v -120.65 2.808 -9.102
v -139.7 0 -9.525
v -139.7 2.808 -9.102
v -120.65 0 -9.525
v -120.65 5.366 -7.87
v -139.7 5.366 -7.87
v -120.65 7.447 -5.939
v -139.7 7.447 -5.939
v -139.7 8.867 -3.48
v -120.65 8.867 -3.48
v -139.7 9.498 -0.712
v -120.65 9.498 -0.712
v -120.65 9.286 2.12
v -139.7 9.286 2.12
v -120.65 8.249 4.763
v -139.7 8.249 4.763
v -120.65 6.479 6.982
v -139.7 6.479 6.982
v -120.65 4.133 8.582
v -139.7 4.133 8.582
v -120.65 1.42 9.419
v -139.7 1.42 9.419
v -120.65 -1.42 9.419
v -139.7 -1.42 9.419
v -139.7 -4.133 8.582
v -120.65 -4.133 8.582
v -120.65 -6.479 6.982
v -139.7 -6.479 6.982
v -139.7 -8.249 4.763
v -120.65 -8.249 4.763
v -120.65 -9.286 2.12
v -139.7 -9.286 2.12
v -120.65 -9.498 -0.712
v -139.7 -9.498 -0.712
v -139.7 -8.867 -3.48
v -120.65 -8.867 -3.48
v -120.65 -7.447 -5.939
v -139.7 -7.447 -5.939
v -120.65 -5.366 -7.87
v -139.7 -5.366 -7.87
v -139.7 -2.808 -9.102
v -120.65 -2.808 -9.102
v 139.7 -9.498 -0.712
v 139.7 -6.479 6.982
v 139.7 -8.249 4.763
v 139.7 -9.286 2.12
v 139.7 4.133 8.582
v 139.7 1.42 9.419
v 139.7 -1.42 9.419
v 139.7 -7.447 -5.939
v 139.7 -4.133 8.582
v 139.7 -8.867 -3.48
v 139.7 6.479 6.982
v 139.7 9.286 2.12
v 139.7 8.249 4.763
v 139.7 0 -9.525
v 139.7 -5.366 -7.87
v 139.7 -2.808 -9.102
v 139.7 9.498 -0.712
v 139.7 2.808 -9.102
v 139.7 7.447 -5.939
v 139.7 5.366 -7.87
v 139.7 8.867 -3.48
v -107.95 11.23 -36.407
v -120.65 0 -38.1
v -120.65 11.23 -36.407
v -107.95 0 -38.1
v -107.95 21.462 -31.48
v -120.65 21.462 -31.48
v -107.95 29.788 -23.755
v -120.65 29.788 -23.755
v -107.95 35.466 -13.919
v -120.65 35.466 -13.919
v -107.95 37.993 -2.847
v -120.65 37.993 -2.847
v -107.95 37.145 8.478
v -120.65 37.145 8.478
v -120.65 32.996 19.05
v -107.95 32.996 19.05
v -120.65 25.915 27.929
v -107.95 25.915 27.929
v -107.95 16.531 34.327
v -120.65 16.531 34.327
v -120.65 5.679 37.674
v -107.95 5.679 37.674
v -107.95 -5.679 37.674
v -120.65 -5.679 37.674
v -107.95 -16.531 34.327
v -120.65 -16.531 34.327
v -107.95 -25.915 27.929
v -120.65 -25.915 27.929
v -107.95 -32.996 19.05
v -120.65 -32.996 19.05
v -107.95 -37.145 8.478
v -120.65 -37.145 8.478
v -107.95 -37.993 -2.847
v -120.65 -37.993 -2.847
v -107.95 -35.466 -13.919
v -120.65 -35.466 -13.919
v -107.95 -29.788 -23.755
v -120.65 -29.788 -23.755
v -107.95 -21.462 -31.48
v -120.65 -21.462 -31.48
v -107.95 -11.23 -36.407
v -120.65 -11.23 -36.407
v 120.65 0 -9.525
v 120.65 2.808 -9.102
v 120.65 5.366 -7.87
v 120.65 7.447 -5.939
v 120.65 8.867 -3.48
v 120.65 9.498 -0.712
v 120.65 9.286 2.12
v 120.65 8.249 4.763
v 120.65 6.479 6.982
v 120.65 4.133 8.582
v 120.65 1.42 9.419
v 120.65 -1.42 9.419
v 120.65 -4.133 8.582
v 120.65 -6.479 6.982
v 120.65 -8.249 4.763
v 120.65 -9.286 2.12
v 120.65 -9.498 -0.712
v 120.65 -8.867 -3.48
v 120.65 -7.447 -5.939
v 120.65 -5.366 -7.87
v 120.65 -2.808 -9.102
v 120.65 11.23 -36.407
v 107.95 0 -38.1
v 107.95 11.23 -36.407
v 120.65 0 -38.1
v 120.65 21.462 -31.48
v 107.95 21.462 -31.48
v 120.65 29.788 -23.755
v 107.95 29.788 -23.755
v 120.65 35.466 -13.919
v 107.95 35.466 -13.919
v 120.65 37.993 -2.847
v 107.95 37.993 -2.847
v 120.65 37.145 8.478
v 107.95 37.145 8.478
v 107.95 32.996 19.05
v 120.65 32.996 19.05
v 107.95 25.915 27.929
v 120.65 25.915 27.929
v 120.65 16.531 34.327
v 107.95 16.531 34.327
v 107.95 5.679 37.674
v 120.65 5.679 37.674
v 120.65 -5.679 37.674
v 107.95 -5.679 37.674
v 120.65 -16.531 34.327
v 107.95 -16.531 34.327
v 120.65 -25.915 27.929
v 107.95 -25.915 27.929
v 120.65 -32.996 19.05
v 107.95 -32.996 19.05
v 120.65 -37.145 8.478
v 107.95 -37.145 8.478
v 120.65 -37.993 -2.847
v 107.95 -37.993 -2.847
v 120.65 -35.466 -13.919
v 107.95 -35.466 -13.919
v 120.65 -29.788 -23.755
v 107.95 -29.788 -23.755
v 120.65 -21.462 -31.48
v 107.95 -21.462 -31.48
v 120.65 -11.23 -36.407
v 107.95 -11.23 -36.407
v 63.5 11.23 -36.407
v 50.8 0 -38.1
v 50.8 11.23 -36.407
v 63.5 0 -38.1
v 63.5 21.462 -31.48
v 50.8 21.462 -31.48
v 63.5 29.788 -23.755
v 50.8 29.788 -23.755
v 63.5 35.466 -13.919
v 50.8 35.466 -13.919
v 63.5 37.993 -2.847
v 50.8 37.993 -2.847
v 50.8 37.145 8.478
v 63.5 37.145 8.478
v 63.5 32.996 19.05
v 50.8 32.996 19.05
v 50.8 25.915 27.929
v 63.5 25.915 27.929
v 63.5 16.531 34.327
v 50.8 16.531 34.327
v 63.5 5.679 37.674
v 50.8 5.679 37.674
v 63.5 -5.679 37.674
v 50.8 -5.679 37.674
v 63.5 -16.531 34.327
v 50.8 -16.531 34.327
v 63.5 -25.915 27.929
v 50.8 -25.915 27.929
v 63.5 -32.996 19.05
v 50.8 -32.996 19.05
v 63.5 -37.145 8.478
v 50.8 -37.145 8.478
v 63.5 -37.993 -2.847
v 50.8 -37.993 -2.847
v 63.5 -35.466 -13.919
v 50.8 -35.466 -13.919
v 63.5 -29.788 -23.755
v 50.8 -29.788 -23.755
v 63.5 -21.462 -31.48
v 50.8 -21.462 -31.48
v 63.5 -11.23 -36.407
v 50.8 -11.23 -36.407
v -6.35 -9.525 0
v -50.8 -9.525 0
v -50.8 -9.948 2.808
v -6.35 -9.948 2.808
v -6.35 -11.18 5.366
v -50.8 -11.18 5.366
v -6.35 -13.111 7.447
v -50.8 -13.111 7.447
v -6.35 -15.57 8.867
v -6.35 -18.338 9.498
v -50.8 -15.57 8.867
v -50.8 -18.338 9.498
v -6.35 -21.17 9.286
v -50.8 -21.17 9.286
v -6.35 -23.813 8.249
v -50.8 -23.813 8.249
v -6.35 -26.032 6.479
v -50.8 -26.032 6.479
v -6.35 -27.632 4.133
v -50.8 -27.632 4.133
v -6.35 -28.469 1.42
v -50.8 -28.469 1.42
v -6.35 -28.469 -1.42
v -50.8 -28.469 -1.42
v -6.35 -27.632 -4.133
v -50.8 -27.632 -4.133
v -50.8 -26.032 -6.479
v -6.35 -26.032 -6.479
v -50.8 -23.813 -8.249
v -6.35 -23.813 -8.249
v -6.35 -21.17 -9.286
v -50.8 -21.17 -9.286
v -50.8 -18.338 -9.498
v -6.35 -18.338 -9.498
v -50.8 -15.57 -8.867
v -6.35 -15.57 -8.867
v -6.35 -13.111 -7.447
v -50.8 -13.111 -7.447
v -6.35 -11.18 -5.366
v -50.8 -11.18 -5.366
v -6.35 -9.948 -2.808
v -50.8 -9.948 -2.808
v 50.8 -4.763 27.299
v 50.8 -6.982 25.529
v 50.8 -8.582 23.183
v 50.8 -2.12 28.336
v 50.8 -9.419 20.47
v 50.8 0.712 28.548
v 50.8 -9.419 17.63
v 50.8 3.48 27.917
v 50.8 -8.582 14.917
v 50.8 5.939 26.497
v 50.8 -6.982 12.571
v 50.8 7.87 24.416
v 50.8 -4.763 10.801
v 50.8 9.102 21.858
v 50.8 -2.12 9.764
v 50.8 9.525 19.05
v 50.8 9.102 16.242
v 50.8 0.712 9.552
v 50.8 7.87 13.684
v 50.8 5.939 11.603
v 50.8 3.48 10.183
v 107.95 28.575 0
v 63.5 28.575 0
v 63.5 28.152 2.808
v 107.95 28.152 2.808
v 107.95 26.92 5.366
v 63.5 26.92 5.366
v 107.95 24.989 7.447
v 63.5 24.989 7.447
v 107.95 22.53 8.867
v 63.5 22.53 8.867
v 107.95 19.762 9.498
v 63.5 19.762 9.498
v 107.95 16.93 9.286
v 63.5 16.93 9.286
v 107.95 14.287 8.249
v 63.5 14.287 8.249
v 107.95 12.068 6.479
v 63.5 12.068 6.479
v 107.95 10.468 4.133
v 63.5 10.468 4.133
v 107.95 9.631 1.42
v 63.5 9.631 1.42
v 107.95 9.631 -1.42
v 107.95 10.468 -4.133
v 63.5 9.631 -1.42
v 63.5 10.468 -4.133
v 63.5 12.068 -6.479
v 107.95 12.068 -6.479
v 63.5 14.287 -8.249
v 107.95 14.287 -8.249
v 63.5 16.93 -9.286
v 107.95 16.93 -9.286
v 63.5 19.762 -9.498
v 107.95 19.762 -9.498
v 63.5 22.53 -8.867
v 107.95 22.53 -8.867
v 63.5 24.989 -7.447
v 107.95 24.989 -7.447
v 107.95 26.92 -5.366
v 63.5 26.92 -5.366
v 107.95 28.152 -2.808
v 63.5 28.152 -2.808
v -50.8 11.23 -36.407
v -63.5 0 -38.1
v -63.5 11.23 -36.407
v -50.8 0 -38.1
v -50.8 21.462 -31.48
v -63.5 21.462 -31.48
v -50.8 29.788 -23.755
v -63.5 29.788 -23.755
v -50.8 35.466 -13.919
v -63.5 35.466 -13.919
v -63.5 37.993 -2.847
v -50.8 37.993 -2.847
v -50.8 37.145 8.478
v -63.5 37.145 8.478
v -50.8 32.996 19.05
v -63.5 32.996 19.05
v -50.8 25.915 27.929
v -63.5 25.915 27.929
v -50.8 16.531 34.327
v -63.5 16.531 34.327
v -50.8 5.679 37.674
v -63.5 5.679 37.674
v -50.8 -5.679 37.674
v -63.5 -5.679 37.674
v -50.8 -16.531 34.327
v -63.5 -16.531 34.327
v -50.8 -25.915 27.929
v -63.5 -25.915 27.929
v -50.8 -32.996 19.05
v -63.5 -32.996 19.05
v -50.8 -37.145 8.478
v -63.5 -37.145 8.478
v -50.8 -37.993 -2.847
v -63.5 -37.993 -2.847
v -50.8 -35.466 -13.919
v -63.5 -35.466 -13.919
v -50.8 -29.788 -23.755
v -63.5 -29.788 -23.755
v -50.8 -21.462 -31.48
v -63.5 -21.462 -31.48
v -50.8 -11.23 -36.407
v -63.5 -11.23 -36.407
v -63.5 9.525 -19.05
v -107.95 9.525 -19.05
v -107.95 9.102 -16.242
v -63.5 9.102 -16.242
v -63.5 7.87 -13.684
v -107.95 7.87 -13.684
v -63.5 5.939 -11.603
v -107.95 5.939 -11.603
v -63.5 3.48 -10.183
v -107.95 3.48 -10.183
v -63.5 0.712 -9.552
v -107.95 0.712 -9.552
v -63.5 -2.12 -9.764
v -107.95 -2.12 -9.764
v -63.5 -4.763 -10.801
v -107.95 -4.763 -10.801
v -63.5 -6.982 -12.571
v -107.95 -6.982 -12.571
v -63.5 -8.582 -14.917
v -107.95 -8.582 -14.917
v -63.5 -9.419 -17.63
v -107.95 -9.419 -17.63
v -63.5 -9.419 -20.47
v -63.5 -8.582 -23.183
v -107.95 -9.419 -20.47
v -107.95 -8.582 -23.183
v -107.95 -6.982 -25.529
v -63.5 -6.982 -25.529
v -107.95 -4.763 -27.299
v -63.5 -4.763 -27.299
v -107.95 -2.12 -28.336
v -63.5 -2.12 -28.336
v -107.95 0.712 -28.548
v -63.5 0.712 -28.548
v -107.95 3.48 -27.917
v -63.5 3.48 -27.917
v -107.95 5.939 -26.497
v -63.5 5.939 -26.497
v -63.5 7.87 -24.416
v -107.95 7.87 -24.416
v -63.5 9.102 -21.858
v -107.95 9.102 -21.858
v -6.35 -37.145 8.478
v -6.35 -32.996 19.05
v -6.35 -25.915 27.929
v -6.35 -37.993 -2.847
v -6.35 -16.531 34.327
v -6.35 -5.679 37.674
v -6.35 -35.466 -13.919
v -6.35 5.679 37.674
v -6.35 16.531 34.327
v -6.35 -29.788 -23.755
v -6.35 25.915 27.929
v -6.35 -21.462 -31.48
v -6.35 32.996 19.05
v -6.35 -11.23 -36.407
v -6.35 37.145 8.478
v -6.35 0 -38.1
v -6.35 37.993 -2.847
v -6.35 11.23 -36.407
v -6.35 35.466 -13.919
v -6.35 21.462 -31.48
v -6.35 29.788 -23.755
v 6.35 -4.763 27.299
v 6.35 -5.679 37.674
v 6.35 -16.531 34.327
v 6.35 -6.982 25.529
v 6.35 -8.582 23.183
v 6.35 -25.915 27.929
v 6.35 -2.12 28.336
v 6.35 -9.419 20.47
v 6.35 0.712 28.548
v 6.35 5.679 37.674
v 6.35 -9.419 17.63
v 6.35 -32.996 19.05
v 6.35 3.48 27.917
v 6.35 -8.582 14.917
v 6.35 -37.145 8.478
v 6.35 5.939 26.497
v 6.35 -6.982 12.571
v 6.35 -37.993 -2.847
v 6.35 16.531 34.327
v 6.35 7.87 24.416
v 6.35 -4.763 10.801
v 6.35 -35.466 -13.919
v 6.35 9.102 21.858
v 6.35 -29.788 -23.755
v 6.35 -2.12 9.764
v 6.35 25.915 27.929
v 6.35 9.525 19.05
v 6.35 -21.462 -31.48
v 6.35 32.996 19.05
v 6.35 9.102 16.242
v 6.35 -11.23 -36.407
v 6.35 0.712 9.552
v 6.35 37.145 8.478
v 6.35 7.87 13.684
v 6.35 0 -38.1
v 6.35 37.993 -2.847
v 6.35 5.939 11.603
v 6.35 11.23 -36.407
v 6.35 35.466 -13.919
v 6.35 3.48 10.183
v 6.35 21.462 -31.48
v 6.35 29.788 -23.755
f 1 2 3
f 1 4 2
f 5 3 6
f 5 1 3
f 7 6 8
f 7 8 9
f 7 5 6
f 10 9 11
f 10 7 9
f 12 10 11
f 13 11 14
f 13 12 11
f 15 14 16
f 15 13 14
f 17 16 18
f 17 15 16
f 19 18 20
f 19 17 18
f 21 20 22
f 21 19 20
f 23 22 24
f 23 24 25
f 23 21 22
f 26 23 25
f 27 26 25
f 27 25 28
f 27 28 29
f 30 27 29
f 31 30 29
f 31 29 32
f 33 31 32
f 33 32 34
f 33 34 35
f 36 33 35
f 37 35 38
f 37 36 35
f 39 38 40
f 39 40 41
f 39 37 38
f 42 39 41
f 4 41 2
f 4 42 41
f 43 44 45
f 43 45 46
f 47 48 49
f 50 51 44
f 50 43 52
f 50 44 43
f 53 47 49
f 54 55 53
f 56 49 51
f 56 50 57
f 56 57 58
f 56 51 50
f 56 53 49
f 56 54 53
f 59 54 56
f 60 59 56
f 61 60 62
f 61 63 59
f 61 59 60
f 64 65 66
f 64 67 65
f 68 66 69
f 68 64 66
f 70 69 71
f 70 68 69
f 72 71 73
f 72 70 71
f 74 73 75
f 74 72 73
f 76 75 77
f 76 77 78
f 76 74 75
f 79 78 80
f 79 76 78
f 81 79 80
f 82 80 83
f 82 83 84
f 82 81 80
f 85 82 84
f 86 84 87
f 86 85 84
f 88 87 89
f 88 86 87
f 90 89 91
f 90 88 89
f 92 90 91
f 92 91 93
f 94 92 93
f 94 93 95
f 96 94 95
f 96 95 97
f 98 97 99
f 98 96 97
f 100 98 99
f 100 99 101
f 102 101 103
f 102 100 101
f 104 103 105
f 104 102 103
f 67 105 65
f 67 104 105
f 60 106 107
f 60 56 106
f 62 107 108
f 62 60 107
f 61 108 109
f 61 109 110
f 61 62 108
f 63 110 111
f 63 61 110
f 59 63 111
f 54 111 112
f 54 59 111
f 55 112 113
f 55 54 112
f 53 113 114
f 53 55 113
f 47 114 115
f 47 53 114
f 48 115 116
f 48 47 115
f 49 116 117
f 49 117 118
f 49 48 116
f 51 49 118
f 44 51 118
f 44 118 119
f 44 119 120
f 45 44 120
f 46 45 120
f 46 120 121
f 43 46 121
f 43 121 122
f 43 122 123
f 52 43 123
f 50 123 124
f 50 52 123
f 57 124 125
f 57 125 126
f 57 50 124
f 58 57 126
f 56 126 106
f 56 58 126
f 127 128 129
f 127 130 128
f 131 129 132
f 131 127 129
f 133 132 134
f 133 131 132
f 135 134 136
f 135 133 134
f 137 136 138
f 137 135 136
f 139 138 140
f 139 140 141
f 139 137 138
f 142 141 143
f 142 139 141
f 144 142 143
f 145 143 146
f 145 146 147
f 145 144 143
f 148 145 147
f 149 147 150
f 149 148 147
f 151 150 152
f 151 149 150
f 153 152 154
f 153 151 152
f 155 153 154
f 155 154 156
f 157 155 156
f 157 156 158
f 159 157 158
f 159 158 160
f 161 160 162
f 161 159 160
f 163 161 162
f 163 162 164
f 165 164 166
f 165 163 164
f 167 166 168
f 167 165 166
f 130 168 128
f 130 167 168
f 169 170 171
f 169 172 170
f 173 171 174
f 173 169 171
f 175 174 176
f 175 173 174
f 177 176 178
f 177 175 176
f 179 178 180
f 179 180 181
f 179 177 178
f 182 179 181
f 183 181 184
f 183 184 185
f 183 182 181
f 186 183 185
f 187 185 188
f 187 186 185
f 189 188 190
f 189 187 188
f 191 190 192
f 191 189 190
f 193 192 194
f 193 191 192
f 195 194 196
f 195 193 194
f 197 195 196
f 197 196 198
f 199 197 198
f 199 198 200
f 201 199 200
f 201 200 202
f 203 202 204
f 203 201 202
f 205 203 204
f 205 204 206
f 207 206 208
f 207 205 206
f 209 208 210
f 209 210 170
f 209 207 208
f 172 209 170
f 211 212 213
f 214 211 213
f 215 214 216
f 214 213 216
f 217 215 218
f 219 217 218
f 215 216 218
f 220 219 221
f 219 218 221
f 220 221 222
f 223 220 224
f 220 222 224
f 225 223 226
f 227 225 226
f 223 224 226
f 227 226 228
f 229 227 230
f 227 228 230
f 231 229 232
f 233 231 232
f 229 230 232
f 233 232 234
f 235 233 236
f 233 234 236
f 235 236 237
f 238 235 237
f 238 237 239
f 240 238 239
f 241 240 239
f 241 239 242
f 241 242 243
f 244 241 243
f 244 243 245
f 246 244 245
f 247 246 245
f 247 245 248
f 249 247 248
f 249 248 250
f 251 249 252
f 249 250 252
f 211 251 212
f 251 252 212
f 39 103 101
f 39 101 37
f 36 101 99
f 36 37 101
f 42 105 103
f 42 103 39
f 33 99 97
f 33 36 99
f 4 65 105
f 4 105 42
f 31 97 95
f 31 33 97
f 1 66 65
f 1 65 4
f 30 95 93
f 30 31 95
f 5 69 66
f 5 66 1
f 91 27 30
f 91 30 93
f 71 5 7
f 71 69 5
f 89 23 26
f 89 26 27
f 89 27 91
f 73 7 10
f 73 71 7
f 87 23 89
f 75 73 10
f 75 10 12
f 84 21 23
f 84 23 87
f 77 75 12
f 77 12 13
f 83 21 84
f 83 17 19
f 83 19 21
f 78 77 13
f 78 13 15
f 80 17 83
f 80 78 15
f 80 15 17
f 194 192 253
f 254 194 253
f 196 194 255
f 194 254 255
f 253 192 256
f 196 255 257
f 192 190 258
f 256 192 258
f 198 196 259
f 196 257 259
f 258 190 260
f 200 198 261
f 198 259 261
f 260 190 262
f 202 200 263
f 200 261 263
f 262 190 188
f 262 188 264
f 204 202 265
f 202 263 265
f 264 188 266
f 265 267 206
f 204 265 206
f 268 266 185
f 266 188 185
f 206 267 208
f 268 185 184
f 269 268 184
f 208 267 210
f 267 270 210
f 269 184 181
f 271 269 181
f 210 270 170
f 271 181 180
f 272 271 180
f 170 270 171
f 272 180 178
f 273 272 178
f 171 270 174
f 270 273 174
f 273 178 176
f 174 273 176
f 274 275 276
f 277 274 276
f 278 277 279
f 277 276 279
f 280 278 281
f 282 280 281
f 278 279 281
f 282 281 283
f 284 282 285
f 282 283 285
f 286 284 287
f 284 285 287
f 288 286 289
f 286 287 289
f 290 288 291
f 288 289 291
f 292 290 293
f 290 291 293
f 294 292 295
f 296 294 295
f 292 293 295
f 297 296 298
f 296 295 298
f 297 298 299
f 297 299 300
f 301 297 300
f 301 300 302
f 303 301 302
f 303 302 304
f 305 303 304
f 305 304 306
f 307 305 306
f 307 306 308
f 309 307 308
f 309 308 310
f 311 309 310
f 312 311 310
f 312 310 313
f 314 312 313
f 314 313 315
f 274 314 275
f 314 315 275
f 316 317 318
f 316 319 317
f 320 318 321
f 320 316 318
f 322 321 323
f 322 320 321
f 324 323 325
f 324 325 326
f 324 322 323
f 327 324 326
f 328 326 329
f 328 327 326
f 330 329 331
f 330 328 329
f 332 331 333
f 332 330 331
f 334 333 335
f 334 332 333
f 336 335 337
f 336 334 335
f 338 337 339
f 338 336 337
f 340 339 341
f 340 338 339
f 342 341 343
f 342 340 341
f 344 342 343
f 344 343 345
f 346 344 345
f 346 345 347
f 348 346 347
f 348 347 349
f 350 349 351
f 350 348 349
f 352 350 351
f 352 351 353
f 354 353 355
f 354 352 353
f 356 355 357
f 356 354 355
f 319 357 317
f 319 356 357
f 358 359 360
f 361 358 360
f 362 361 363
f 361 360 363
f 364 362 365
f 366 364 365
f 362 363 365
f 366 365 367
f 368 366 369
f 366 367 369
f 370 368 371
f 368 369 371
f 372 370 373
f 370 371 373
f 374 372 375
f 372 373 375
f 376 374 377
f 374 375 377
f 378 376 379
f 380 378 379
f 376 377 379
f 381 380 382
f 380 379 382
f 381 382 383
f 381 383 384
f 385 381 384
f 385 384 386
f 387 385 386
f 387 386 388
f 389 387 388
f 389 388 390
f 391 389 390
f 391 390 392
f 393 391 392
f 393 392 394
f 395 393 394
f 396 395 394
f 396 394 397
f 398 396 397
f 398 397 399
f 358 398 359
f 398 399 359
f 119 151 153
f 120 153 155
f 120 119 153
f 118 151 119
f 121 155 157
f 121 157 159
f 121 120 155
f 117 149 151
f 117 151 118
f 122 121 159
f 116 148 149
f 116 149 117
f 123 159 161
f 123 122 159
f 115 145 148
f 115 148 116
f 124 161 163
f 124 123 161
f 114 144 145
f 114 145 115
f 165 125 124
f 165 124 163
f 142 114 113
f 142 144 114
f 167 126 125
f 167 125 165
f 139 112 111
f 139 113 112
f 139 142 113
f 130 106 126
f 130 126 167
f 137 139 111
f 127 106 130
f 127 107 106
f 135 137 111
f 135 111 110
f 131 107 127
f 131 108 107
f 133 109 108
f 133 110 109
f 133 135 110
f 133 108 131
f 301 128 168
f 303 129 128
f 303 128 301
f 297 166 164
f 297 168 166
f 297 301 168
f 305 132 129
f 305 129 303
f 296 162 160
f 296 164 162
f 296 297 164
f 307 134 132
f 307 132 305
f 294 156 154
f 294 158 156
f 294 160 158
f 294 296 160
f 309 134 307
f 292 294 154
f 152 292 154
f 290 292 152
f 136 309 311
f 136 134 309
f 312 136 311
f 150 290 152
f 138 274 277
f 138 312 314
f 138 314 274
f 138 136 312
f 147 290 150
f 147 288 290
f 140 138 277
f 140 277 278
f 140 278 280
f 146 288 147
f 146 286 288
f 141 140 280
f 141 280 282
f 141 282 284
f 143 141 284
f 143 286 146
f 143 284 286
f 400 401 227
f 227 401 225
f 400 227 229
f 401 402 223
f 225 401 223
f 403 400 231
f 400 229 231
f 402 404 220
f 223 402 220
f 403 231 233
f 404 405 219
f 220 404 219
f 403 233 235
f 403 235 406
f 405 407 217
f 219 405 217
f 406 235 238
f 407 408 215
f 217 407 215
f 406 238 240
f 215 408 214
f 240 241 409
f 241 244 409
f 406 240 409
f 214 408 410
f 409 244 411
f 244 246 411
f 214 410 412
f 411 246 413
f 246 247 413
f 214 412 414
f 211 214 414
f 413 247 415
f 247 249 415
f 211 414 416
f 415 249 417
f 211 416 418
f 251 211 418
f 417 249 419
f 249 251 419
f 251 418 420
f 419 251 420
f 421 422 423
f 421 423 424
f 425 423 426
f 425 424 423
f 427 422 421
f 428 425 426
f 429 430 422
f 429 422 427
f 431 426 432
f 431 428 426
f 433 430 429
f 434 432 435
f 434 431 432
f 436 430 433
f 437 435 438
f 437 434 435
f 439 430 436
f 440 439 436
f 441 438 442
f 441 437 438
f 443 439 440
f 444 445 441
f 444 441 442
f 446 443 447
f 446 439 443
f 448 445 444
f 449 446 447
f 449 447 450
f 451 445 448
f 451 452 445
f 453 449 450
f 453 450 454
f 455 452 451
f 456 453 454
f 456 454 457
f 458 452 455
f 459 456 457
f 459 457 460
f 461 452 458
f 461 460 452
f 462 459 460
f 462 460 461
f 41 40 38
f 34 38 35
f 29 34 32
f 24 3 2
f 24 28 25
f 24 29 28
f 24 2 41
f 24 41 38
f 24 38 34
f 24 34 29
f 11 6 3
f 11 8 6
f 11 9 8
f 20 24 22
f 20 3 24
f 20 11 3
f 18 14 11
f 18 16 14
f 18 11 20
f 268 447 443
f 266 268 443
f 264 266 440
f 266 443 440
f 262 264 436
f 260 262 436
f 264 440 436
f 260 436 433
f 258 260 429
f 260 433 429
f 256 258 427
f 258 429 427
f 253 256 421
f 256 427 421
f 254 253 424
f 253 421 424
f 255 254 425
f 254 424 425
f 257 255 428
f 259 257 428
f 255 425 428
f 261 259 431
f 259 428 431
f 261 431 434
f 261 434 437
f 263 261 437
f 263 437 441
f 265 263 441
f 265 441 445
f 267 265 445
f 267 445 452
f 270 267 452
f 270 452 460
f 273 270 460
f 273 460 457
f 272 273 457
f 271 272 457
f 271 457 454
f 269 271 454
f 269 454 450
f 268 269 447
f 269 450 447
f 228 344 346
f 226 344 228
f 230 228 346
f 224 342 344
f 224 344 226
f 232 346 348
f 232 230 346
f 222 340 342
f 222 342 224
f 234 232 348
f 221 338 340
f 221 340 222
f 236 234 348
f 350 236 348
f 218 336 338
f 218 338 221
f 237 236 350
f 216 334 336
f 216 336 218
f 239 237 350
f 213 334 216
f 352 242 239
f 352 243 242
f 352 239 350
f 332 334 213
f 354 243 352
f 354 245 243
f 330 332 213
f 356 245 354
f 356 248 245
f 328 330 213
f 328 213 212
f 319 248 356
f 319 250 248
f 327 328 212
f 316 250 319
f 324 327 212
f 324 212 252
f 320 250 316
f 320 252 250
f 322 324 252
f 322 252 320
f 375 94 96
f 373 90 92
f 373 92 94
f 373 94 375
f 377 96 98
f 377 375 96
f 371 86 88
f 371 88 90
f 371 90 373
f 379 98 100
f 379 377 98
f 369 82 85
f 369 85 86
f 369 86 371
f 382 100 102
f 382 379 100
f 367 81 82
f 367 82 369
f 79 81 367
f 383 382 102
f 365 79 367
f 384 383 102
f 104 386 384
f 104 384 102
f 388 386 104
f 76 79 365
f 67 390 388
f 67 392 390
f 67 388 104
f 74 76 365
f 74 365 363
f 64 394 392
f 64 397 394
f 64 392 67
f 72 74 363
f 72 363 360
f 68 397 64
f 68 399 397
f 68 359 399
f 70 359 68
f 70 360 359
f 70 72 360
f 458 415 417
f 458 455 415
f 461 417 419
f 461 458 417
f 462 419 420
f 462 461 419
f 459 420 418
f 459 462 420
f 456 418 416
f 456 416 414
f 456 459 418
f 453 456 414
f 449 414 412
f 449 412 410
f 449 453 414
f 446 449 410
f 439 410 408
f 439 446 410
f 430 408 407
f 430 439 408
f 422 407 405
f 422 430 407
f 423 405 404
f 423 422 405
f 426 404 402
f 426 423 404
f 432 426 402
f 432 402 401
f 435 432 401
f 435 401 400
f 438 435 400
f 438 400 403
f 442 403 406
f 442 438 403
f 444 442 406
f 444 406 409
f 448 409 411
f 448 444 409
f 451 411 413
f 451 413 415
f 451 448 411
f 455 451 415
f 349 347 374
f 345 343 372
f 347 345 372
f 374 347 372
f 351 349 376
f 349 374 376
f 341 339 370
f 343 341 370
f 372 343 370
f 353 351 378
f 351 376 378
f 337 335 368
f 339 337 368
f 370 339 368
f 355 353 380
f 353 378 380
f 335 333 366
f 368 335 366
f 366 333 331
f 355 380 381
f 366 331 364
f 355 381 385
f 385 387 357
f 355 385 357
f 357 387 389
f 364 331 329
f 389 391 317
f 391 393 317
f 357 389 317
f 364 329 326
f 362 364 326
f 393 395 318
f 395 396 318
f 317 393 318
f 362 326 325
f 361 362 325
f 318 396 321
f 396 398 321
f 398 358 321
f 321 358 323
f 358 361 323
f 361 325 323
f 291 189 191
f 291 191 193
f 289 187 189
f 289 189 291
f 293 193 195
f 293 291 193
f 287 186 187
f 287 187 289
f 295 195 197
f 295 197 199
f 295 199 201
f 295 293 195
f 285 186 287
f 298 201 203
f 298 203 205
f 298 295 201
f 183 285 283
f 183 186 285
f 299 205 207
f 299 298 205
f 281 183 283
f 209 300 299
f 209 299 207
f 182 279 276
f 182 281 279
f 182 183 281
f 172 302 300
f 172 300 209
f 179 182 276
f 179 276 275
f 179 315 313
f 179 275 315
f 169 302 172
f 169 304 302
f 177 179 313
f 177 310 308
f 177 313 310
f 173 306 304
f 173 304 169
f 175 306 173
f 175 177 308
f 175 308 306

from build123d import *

# Parameters (mm, degrees)
F0_W     = 12.7
F0_H     = 38.1
F0_W_2   = 6.35
F2_R     = 9.525
F3_DEPTH = 44.45
F4_R     = 9.525
F5_DEPTH = 44.45
F6_R     = 9.525
F7_DEPTH = 44.45
F8_R     = 9.525
F9_DEPTH = 44.45


with BuildPart() as f1:
    # F0 (on Front) → F1 (revolve)
    with BuildSketch(Plane.XZ):
        Polygon((-107.95, 0), (-139.7, 0), (-139.7, -9.525), (-120.65, -9.525), (-120.65, -38.1), (-107.95, -38.1), align=None)
        with Locations((-57.15, -19.05)):
            Rectangle(F0_W, F0_H)
        with Locations((-3.175, -19.05)):
            Rectangle(F0_W_2, F0_H)
        with Locations((3.175, -19.05)):
            Rectangle(F0_W_2, F0_H)
        with Locations((57.15, -19.05)):
            Rectangle(F0_W, F0_H)
        Polygon((107.95, 0), (107.95, -38.1), (120.65, -38.1), (120.65, -9.525), (139.7, -9.525), (139.7, 0), align=None)
    revolve(axis=Axis((14.184596, 0, 0), (1, 0, 0)))

    # F2 (on face) → F3 (join, through all)
    with BuildSketch(Plane.YZ.offset(-107.95)):
        with Locations((0, -19.05)):
            Circle(F2_R)
    extrude(amount=F3_DEPTH)

    # F4 (on face) → F5 (join, through all)
    with BuildSketch(Plane.YZ.offset(-50.8)):
        with Locations((-19.05, 0)):
            Circle(F4_R)
    extrude(amount=F5_DEPTH)

    # F6 (on face) → F7 (join, through all)
    with BuildSketch(Plane.YZ.offset(6.35)):
        with Locations((0, 19.05)):
            Circle(F6_R)
    extrude(amount=F7_DEPTH)

    # F8 (on face) → F9 (join, through all)
    with BuildSketch(Plane.YZ.offset(63.5)):
        with Locations((19.05, 0)):
            Circle(F8_R)
    extrude(amount=F9_DEPTH)


solid = f1.part
